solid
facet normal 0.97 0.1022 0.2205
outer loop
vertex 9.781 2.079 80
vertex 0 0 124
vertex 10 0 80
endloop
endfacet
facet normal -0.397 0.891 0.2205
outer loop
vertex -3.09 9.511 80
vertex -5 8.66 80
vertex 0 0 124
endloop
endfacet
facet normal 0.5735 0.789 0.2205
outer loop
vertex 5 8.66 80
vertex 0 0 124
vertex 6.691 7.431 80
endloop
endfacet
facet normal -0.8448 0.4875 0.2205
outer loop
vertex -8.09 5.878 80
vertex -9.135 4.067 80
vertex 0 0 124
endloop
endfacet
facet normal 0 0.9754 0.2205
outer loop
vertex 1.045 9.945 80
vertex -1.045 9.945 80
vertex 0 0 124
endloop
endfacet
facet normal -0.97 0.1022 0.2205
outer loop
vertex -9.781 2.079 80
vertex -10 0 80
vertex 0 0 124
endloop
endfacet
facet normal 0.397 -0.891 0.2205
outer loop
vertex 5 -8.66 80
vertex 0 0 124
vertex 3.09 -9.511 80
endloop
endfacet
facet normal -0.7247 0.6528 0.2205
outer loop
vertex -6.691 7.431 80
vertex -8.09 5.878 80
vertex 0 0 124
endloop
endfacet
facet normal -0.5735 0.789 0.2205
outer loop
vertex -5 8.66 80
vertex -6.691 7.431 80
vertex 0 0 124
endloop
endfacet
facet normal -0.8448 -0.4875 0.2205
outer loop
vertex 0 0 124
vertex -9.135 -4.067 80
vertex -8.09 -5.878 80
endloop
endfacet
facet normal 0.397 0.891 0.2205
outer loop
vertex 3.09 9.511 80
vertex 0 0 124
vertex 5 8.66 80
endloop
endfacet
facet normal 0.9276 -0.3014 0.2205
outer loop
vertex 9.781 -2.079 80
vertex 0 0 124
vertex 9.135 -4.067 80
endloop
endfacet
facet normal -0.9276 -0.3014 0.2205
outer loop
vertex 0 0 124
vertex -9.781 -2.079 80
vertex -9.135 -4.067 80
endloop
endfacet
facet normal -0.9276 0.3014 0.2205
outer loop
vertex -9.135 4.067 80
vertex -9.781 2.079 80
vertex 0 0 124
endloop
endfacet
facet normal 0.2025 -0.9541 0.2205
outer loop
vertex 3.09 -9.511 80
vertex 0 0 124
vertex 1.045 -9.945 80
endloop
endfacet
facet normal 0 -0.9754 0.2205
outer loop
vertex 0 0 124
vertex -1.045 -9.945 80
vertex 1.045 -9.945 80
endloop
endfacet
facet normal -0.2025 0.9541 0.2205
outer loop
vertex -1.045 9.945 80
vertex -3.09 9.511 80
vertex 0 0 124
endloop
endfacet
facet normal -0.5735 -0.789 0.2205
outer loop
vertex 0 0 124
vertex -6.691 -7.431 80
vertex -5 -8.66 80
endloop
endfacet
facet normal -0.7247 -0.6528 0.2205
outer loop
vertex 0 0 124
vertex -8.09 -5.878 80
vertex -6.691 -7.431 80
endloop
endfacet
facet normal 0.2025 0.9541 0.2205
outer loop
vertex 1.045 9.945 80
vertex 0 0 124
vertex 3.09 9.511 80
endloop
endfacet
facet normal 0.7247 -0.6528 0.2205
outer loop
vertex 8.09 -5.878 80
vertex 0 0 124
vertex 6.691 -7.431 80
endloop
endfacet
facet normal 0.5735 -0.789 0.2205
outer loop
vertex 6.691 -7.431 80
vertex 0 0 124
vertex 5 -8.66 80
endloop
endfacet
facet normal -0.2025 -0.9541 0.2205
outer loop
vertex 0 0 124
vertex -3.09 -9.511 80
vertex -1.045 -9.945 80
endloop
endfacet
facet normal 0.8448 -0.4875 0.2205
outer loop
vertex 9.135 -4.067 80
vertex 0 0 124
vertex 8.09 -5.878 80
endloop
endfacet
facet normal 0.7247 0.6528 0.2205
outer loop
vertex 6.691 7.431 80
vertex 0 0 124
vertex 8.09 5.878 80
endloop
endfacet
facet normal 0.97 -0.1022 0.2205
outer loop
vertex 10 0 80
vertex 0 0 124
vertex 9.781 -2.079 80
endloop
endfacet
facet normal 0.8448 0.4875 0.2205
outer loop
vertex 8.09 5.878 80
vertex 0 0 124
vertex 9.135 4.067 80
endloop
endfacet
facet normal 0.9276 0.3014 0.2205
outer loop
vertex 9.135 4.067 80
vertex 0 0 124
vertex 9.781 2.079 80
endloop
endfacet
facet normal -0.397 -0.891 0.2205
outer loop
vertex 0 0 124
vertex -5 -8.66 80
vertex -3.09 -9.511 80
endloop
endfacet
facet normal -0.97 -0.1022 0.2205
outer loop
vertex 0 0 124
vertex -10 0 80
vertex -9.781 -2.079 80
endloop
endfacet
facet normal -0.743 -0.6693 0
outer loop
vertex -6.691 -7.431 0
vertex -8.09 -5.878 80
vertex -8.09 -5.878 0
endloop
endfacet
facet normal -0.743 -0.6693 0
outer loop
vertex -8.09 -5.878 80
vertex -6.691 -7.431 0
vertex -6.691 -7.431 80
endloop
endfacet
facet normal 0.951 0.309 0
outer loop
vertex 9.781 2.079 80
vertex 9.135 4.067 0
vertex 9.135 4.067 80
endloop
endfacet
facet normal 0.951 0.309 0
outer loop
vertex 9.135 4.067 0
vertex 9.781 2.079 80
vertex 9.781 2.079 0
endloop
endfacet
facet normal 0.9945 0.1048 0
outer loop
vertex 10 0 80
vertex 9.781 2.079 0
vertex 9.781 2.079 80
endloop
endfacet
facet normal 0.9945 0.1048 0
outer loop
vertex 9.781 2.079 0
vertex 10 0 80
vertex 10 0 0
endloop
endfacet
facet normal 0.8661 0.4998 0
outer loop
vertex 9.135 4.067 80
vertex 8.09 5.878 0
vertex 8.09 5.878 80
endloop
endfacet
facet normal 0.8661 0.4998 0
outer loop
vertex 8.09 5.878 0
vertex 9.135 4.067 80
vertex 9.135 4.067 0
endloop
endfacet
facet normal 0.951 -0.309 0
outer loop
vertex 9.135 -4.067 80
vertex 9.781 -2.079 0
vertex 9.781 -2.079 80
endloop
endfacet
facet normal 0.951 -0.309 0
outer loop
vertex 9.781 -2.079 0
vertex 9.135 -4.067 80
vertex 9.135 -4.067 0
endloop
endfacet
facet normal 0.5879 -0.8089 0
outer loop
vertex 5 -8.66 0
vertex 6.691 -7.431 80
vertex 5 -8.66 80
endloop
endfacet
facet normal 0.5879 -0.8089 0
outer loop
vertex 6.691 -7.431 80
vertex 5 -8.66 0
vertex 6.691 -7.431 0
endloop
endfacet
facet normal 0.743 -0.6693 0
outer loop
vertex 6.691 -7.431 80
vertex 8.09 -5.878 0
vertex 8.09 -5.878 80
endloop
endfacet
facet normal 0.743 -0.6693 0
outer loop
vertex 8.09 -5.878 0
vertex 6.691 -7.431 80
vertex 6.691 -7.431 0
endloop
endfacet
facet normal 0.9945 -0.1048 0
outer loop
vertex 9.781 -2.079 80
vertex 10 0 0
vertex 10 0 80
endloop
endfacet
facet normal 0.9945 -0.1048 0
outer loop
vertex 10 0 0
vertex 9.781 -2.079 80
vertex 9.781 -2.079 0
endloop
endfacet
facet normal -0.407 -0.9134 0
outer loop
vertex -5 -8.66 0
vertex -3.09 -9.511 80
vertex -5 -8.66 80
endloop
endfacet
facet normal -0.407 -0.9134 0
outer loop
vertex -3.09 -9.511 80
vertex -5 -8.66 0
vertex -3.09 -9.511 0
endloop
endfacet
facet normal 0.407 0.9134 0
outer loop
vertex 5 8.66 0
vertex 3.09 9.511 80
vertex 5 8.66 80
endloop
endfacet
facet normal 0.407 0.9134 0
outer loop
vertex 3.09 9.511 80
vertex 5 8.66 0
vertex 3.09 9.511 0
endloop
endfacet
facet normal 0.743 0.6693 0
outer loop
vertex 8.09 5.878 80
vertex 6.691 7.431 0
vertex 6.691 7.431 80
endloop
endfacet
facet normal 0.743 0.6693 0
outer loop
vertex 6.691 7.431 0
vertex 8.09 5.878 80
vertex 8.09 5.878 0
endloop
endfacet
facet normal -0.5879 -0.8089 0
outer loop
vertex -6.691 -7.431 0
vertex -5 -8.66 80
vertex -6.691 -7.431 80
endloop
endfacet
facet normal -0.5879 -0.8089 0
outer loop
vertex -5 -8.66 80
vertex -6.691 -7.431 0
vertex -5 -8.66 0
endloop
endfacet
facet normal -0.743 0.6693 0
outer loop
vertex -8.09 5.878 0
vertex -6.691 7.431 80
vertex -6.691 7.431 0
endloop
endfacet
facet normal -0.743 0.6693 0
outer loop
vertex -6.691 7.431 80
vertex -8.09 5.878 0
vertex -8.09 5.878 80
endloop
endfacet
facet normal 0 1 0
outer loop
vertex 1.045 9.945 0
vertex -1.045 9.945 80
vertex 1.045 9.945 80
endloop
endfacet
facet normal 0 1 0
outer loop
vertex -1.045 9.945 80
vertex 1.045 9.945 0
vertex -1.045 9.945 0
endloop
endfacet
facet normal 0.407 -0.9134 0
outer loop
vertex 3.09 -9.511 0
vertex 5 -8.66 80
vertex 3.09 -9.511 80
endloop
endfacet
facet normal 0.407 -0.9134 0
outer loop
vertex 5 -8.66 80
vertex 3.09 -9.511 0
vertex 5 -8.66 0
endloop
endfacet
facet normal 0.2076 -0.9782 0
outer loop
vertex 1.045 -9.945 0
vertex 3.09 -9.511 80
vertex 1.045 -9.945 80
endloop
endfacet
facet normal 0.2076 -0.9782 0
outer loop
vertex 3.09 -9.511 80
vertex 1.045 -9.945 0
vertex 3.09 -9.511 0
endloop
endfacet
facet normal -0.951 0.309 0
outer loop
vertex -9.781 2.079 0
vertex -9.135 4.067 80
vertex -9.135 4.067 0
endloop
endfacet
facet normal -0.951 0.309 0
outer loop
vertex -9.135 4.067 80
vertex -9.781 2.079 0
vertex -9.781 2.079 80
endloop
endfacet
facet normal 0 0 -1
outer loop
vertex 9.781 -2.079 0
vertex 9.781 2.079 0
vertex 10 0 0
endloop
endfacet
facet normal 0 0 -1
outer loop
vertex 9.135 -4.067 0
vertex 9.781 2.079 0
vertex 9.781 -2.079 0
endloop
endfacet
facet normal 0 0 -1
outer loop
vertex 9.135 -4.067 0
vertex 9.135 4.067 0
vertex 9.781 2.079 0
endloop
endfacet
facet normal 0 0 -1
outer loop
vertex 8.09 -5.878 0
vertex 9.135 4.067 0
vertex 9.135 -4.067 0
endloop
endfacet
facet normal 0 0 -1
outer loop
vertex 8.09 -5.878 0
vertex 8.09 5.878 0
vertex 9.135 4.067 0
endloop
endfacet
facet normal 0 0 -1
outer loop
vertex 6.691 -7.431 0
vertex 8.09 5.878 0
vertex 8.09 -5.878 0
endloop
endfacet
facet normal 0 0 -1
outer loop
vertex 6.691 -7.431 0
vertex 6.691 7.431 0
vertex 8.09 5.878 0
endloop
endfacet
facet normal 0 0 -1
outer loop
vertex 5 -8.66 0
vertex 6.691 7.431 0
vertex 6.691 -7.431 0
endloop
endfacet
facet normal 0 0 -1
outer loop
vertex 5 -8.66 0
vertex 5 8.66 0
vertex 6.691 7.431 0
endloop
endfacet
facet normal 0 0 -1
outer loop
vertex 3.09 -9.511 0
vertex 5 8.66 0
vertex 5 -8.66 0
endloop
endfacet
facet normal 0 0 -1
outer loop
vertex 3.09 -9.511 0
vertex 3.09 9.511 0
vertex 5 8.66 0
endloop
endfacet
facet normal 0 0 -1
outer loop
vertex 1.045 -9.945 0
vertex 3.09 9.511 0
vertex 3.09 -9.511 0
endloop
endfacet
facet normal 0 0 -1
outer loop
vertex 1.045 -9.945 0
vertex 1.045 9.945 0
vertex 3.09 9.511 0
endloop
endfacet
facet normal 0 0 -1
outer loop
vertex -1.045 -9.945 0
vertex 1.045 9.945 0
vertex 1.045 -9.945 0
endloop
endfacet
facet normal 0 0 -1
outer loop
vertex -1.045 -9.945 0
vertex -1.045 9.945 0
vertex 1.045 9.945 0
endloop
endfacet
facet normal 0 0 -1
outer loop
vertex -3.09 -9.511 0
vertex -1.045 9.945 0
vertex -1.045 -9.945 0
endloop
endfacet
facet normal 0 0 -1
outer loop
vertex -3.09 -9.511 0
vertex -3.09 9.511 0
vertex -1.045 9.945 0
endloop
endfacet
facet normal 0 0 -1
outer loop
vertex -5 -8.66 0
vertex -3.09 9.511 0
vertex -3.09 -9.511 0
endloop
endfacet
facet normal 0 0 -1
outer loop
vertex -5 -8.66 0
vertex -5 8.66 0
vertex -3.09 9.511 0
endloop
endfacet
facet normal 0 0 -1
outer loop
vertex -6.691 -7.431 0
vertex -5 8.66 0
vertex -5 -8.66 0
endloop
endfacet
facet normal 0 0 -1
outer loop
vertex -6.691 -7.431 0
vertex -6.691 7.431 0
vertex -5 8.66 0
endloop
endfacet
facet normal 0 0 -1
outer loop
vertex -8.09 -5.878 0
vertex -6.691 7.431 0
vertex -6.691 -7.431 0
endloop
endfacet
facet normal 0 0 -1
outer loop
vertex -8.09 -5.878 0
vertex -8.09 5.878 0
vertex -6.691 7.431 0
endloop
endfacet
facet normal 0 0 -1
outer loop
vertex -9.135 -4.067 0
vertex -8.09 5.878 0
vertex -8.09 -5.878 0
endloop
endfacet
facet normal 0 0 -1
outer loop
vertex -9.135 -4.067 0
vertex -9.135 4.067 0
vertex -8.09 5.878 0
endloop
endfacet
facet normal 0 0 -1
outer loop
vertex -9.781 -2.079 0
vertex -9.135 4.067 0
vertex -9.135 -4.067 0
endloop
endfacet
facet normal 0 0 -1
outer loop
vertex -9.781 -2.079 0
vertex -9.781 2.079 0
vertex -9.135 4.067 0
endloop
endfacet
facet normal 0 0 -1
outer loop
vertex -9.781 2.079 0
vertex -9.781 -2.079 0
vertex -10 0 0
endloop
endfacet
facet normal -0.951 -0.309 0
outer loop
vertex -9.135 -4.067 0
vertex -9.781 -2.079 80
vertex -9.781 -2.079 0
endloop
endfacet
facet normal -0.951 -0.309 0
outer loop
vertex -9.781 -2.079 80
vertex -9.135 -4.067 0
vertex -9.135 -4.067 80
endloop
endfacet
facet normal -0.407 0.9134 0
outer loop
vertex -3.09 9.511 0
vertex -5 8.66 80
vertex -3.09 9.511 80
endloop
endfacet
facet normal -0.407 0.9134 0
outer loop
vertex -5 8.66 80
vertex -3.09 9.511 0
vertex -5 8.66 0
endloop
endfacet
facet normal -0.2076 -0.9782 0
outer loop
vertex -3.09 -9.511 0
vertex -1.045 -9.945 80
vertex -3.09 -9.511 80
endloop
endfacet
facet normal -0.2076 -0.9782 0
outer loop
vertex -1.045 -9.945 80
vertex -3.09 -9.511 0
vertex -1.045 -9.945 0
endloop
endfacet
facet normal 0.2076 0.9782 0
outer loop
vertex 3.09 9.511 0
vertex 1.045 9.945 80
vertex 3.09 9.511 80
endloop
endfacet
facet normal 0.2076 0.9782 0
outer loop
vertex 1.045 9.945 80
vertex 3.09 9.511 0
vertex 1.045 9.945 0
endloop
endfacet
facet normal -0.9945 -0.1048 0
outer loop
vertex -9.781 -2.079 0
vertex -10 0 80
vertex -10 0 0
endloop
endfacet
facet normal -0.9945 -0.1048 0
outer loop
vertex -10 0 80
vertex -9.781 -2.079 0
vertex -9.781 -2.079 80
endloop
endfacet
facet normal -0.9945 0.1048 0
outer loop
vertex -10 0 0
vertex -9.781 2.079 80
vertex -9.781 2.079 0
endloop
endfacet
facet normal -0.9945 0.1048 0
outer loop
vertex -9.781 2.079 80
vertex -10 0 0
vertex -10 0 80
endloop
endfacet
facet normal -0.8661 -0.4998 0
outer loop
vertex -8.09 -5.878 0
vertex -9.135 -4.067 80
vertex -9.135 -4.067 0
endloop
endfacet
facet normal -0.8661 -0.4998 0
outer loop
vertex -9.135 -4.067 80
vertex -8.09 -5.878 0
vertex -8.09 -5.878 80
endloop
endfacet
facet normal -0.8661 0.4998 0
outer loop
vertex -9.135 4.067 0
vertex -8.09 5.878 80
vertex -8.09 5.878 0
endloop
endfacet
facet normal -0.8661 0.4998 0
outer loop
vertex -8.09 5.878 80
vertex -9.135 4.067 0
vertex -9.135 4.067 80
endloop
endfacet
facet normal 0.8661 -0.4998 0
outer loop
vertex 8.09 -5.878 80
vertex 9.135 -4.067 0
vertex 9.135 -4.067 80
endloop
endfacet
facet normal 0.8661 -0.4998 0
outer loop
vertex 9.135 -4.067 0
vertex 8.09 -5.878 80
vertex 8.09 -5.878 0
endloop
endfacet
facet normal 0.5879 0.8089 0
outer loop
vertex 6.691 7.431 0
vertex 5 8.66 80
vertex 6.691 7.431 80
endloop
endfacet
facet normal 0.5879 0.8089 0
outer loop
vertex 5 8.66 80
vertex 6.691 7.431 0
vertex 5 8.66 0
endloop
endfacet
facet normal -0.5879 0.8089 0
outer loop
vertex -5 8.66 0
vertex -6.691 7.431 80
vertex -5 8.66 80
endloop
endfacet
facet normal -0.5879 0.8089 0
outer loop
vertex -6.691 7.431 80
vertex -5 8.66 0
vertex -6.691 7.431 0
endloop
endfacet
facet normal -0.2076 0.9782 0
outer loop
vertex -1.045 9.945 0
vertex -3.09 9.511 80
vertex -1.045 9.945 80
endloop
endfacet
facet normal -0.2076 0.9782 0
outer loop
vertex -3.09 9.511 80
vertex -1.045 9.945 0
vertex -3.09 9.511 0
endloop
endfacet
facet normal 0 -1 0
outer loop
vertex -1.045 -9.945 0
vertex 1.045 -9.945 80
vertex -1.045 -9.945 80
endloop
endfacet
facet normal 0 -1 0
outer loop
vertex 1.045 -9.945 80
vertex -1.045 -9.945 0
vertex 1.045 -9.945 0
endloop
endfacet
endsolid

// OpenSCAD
//Rocket Tube Height
rheight = 80;

//Rocket Tube Width
rwidth = 10;

//Number of Fins
nfins = 5; // [0,1,2,3,4,5,6,7,8,9,10]

//Body
translate([0,0,rheight])
cylinder(0.55*rheight,rwidth,0);

//Cone
cylinder(rheight,rwidth,rwidth);

//N Fin
for (i = [0:nfins-1])
{
	//Rotate the fin around the centre
	rotate([90,0,(360/nfins)*i])translate([rwidth,0,0])//Push it our radius
	{ 
		//Design each fin
		polygon(points=[[0,0],[0,rheight*0.4],[rheight*0.2,0]],paths=[[0,1,2]]);
	}

}
